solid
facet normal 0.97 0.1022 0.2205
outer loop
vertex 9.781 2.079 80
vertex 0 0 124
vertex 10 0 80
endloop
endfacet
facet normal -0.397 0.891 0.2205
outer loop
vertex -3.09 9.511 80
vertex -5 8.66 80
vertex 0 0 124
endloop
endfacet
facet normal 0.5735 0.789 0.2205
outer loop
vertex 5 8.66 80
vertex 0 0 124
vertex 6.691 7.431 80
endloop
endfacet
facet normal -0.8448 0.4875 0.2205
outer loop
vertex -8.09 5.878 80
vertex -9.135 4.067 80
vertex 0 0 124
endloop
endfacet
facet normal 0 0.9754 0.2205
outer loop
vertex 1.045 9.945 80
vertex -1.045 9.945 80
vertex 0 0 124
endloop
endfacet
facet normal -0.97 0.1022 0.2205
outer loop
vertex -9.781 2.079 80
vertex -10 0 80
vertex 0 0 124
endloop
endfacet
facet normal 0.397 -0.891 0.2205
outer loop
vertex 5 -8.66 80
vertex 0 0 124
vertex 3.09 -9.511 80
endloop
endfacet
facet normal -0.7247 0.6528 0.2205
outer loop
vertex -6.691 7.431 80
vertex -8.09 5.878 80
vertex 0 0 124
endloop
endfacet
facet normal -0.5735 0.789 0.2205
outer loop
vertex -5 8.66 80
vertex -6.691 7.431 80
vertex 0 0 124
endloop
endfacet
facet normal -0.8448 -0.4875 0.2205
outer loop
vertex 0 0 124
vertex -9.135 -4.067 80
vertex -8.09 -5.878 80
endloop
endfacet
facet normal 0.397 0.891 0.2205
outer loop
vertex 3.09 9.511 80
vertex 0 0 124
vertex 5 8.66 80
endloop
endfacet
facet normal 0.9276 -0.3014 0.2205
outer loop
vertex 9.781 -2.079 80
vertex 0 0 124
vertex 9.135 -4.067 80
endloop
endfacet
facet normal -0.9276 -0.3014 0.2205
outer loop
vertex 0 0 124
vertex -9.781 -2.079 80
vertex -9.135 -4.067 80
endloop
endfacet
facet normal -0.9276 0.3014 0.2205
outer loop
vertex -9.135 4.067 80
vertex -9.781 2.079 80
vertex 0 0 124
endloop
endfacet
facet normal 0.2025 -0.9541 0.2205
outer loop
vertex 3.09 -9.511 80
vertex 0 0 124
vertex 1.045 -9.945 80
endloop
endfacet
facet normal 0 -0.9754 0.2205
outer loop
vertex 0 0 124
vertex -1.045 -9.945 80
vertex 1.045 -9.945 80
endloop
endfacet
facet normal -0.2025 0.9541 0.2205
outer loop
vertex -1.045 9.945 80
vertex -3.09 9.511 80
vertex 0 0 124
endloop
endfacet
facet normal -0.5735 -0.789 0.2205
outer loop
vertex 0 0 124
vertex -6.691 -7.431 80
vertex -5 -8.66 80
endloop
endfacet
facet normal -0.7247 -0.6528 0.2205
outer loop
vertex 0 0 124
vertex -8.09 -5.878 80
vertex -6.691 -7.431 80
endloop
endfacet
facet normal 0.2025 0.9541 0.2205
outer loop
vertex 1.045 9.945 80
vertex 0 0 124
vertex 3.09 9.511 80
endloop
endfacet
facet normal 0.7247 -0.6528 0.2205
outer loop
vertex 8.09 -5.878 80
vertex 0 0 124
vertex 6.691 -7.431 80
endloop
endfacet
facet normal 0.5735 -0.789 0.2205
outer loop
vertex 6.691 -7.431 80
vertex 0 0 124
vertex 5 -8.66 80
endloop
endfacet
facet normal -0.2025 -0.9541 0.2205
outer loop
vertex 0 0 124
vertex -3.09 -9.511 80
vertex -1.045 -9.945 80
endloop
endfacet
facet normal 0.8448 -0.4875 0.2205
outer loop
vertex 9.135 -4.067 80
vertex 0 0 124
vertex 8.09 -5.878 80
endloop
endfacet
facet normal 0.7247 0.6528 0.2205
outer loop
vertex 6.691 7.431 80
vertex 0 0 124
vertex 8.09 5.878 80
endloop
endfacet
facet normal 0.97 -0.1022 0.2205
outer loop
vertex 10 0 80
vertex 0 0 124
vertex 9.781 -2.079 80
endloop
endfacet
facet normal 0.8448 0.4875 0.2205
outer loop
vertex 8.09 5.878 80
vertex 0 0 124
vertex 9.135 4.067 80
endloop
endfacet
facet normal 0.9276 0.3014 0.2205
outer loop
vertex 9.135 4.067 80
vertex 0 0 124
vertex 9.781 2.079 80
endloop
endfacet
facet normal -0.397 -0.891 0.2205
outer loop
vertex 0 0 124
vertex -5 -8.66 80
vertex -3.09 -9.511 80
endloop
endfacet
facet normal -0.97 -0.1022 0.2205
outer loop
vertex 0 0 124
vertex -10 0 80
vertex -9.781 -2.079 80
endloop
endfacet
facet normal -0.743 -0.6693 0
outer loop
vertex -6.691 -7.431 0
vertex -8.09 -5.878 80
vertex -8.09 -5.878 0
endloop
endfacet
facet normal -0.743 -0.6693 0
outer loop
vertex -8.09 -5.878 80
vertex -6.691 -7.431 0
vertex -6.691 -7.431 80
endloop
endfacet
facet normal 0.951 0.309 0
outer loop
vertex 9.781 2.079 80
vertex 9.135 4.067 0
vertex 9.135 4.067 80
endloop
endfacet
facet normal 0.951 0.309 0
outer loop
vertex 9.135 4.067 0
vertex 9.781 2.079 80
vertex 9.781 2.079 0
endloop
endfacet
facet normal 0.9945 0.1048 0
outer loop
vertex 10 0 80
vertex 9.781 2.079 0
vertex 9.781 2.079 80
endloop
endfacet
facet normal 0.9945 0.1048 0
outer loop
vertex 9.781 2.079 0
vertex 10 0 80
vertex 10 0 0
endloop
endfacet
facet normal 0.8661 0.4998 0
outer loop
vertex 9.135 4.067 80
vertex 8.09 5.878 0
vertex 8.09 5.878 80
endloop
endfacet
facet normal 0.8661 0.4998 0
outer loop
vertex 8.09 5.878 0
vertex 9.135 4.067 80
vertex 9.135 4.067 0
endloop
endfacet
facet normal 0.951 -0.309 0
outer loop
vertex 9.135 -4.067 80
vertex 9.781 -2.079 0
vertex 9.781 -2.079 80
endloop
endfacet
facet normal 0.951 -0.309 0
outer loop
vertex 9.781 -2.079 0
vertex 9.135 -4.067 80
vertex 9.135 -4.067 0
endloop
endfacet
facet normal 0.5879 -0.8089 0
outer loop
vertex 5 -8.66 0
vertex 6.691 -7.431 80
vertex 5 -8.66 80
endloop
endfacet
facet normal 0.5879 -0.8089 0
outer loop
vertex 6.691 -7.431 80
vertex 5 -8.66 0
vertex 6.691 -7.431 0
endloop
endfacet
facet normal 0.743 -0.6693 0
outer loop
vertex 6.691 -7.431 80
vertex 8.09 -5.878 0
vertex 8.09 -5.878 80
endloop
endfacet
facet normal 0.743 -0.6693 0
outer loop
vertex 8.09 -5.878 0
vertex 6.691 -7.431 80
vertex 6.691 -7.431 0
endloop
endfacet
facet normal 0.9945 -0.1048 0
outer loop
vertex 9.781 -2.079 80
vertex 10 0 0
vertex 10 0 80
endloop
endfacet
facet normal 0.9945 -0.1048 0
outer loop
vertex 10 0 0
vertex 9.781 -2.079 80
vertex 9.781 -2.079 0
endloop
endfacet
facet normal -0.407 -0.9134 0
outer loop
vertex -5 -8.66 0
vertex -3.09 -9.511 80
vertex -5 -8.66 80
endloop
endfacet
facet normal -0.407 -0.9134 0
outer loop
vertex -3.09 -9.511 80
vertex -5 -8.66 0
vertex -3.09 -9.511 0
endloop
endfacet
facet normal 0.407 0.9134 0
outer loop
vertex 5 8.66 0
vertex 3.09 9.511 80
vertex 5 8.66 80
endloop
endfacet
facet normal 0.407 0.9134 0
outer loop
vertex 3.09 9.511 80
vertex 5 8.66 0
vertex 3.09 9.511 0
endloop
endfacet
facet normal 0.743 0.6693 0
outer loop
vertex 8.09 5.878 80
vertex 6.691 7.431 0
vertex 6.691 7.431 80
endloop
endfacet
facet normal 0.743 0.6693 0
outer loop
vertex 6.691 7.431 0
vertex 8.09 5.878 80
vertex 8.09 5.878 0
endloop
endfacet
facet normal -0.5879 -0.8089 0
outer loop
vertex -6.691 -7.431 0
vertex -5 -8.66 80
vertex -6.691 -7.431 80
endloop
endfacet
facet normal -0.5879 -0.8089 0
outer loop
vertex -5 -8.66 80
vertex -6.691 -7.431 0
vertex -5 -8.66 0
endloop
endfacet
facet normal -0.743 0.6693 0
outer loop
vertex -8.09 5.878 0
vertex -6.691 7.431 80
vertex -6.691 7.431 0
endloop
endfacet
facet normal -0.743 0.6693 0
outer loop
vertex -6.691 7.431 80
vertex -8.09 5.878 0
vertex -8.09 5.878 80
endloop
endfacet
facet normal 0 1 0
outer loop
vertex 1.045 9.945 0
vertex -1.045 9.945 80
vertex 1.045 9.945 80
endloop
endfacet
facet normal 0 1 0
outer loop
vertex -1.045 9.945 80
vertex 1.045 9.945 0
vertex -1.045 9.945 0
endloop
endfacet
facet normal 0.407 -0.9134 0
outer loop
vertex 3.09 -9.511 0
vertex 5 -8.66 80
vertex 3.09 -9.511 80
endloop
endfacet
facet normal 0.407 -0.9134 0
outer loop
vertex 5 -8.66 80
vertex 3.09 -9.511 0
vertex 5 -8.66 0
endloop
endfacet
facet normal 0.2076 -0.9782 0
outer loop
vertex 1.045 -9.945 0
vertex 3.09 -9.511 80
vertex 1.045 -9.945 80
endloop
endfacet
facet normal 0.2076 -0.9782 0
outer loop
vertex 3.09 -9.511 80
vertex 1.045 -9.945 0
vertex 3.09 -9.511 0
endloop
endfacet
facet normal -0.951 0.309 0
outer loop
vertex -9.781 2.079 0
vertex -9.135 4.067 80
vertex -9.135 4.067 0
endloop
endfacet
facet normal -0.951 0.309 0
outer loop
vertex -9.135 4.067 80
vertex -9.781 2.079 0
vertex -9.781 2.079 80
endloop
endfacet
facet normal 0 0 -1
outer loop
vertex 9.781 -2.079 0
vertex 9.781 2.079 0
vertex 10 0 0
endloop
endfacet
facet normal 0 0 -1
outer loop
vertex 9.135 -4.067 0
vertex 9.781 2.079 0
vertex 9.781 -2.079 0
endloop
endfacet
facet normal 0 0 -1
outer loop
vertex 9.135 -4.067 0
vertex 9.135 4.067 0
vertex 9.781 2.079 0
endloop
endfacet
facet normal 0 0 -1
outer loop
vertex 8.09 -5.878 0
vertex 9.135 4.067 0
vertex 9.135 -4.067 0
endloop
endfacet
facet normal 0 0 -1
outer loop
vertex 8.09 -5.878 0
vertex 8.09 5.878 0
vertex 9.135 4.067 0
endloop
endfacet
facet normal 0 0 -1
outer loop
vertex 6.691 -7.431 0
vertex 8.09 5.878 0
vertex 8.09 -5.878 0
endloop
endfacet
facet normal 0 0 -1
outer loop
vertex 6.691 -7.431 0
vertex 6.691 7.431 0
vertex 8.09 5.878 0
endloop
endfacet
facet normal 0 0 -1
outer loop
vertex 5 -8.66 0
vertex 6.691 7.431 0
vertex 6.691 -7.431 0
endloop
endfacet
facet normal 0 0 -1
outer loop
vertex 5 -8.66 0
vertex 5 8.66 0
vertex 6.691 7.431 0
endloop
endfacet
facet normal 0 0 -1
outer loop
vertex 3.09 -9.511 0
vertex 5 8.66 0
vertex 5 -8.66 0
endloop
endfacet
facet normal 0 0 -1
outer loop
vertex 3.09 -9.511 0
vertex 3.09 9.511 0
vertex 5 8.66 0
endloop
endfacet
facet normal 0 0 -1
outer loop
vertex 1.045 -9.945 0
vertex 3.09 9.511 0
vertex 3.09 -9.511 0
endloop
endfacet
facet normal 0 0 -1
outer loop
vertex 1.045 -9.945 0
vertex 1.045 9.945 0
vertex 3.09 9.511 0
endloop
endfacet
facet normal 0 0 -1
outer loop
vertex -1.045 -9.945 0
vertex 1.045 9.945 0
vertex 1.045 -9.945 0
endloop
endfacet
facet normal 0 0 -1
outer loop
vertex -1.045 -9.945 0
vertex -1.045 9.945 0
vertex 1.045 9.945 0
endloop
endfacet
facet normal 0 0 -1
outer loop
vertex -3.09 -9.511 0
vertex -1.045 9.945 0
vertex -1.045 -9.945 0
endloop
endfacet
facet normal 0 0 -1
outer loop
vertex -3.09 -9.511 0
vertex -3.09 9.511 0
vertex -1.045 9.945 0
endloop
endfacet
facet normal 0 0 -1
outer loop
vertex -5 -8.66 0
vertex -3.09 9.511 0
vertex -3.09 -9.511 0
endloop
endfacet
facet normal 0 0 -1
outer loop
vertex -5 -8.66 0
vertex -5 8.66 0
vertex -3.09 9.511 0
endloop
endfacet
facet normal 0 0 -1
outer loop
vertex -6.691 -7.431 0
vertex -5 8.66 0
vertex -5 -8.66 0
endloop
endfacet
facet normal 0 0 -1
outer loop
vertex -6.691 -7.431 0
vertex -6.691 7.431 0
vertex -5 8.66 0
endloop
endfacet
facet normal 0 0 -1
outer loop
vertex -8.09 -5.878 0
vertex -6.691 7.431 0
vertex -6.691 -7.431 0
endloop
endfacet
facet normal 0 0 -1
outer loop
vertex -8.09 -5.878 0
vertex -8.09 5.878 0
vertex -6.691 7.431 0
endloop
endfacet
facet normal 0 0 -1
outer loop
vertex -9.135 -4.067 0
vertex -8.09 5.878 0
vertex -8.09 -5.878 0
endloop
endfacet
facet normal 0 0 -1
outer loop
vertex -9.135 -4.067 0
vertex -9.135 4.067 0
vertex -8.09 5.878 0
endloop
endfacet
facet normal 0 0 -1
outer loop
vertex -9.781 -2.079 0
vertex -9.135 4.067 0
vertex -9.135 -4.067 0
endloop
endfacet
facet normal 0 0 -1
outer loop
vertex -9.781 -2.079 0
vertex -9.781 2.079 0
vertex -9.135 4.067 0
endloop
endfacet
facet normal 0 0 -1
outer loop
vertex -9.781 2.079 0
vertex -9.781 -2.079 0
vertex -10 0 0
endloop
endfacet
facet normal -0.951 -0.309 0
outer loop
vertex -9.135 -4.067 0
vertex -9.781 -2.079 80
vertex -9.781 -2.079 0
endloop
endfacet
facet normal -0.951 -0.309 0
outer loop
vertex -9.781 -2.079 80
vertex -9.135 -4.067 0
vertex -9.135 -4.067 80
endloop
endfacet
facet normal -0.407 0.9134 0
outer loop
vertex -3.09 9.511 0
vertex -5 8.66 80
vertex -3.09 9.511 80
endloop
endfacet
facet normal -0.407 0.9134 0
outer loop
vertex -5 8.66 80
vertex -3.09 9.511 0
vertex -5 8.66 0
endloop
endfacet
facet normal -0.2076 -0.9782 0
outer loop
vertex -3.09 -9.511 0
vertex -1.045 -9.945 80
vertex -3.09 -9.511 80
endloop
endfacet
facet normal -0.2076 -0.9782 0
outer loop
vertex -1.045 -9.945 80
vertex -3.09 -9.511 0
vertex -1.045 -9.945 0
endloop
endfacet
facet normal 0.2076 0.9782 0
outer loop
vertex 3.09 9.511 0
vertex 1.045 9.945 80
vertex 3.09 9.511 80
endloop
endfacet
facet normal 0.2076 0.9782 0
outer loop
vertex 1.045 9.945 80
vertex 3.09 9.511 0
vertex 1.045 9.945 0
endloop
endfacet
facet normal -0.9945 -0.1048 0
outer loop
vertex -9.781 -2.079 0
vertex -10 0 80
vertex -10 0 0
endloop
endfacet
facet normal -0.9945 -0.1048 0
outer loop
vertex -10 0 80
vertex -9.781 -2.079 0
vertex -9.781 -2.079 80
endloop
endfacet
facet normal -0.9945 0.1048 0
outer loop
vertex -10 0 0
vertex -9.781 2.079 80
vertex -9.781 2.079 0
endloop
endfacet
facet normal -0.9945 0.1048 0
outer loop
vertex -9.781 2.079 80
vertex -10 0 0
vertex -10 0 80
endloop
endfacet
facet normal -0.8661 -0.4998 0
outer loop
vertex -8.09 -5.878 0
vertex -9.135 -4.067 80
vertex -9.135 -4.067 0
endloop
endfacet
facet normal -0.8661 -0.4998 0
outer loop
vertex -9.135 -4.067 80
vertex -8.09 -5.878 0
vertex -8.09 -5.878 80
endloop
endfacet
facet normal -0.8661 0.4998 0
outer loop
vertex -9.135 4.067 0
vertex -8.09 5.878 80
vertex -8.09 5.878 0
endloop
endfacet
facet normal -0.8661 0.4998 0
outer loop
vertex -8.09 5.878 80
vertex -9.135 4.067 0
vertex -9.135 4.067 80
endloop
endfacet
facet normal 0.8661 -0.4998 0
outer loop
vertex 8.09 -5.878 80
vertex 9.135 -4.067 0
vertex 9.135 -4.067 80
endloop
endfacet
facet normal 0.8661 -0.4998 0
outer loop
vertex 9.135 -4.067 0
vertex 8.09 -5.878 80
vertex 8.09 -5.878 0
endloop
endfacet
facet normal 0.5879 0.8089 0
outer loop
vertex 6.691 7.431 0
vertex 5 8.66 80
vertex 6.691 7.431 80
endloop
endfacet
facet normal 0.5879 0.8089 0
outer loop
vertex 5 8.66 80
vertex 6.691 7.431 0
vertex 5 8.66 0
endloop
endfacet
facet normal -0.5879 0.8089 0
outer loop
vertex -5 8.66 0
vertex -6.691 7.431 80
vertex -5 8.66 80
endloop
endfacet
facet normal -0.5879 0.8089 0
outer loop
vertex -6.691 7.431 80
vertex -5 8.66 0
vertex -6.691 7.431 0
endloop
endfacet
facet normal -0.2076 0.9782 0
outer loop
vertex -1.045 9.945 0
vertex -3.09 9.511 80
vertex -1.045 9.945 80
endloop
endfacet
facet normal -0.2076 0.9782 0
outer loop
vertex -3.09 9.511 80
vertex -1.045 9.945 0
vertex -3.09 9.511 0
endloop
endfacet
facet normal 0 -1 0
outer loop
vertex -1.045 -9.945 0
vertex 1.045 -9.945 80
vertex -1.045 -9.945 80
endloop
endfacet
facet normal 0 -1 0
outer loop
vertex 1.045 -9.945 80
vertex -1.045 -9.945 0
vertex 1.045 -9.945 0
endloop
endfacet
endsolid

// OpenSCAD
//Rocket Tube Height
rheight = 80;

//Rocket Tube Width
rwidth = 10;

//Number of Fins
nfins = 5; // [0,1,2,3,4,5,6,7,8,9,10]

//Body
translate([0,0,rheight])
cylinder(0.55*rheight,rwidth,0);

//Cone
cylinder(rheight,rwidth,rwidth);

//N Fin
for (i = [0:nfins-1])
{
	//Rotate the fin around the centre
	rotate([90,0,(360/nfins)*i])translate([rwidth,0,0])//Push it our radius
	{ 
		//Design each fin
		polygon(points=[[0,0],[0,rheight*0.4],[rheight*0.2,0]],paths=[[0,1,2]]);
	}

}
